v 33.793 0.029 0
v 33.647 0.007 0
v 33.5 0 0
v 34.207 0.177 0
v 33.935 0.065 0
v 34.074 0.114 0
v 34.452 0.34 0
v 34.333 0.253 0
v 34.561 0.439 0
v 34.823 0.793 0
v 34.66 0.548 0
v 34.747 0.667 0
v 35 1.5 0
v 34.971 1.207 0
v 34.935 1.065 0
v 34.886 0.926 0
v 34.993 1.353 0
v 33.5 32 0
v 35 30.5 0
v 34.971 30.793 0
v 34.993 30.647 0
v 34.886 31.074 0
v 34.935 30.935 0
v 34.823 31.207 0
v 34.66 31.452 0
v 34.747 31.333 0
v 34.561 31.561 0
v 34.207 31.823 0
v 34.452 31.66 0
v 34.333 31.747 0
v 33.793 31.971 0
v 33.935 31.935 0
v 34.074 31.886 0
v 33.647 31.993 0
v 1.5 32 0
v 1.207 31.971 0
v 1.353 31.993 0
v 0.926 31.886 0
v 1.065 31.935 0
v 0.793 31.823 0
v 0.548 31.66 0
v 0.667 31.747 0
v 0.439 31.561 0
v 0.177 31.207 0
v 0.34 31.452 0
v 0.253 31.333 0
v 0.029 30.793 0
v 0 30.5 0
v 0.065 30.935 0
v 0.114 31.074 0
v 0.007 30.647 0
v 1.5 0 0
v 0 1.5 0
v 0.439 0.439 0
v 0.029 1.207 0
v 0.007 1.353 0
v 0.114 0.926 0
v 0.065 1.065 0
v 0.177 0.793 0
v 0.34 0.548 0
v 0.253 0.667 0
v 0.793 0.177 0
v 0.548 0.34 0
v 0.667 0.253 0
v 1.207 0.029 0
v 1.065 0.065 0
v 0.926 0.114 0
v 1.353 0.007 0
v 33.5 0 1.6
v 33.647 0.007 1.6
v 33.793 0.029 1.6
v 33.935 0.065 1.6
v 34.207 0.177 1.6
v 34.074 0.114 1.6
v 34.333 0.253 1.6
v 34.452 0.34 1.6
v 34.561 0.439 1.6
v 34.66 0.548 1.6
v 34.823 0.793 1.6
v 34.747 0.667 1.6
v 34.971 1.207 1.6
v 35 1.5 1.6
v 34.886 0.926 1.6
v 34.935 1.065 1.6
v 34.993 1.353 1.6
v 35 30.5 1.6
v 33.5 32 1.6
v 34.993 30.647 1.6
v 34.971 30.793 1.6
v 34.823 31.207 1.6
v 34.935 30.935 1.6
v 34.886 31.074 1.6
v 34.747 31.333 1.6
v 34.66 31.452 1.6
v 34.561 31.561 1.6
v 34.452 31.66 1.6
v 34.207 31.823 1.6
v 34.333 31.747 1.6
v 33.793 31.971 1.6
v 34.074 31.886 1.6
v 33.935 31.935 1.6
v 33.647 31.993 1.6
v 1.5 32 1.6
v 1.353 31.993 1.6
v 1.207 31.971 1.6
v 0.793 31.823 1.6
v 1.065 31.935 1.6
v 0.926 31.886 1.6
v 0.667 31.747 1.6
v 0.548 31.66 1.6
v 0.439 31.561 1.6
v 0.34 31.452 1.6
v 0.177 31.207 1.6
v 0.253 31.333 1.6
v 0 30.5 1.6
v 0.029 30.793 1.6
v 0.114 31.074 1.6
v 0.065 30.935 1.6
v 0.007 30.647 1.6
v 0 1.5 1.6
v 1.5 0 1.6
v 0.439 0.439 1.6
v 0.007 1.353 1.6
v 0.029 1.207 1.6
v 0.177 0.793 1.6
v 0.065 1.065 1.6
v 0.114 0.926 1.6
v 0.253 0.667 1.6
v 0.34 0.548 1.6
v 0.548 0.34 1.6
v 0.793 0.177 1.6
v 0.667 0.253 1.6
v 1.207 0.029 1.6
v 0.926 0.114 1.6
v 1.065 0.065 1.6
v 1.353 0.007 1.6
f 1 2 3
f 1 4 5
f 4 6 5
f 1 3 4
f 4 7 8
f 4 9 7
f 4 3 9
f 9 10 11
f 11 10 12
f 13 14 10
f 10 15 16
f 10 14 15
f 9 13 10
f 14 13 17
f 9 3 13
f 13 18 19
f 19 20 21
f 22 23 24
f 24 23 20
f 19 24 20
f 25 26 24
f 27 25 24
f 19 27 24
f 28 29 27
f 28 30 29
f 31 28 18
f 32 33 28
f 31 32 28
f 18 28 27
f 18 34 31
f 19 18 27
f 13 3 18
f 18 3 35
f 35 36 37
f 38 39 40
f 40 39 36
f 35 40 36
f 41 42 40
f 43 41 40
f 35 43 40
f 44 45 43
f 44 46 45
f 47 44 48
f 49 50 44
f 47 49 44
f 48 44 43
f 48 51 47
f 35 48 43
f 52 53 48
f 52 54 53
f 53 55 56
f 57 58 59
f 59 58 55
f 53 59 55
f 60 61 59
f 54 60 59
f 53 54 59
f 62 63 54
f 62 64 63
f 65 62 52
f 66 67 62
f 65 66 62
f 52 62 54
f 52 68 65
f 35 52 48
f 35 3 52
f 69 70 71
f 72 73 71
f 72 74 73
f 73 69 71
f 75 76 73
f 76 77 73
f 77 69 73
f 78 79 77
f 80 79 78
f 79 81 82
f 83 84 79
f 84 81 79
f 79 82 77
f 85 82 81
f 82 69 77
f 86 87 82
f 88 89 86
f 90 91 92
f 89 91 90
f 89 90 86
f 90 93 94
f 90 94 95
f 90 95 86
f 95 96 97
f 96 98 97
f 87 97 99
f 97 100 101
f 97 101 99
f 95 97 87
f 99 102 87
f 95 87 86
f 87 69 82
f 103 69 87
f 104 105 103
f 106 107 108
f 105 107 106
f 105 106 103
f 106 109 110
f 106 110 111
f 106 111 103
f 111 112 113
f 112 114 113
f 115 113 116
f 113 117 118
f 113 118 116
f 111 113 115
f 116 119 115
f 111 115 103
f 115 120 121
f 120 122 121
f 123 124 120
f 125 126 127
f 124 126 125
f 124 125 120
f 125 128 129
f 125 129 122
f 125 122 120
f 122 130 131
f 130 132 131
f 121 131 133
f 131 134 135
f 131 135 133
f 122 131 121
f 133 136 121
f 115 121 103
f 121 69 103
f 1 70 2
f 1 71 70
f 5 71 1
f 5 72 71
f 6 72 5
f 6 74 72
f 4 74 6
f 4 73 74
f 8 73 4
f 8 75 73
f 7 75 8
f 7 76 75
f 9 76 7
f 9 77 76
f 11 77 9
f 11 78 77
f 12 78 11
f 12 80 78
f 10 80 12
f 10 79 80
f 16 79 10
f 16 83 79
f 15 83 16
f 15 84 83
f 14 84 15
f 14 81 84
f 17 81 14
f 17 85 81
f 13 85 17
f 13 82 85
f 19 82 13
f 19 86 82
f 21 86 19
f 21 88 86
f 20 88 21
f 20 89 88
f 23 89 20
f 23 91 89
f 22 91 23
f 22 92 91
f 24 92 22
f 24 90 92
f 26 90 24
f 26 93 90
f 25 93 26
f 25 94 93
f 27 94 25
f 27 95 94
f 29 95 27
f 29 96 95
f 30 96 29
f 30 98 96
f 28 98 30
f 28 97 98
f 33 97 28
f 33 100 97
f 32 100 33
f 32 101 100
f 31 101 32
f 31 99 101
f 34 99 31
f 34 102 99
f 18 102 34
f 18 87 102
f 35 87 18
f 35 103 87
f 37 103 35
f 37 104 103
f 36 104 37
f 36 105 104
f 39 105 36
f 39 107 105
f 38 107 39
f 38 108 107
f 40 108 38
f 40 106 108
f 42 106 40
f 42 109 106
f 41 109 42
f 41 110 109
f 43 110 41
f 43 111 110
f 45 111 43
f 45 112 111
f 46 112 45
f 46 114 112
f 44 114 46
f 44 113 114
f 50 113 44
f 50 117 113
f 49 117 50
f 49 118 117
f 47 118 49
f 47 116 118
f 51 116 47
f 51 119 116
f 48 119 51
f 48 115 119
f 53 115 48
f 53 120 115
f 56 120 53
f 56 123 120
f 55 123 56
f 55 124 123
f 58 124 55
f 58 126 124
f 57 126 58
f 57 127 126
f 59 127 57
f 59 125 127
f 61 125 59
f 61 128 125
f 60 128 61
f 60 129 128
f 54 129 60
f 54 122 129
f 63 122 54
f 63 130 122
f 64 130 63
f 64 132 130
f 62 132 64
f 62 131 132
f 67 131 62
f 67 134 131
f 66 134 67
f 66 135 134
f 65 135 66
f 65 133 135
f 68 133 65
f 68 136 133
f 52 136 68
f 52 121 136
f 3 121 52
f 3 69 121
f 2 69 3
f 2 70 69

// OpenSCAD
$fn = 64;

module motor_driver_module(len=35.0, wid=32.0, th=1.6, corner_r=1.5) {
    corner_r = min(corner_r, min(len, wid)/2);

    linear_extrude(height=th)
        offset(r=corner_r)
            offset(delta=-corner_r)
                square([len, wid], center=false);
}

motor_driver_module();
